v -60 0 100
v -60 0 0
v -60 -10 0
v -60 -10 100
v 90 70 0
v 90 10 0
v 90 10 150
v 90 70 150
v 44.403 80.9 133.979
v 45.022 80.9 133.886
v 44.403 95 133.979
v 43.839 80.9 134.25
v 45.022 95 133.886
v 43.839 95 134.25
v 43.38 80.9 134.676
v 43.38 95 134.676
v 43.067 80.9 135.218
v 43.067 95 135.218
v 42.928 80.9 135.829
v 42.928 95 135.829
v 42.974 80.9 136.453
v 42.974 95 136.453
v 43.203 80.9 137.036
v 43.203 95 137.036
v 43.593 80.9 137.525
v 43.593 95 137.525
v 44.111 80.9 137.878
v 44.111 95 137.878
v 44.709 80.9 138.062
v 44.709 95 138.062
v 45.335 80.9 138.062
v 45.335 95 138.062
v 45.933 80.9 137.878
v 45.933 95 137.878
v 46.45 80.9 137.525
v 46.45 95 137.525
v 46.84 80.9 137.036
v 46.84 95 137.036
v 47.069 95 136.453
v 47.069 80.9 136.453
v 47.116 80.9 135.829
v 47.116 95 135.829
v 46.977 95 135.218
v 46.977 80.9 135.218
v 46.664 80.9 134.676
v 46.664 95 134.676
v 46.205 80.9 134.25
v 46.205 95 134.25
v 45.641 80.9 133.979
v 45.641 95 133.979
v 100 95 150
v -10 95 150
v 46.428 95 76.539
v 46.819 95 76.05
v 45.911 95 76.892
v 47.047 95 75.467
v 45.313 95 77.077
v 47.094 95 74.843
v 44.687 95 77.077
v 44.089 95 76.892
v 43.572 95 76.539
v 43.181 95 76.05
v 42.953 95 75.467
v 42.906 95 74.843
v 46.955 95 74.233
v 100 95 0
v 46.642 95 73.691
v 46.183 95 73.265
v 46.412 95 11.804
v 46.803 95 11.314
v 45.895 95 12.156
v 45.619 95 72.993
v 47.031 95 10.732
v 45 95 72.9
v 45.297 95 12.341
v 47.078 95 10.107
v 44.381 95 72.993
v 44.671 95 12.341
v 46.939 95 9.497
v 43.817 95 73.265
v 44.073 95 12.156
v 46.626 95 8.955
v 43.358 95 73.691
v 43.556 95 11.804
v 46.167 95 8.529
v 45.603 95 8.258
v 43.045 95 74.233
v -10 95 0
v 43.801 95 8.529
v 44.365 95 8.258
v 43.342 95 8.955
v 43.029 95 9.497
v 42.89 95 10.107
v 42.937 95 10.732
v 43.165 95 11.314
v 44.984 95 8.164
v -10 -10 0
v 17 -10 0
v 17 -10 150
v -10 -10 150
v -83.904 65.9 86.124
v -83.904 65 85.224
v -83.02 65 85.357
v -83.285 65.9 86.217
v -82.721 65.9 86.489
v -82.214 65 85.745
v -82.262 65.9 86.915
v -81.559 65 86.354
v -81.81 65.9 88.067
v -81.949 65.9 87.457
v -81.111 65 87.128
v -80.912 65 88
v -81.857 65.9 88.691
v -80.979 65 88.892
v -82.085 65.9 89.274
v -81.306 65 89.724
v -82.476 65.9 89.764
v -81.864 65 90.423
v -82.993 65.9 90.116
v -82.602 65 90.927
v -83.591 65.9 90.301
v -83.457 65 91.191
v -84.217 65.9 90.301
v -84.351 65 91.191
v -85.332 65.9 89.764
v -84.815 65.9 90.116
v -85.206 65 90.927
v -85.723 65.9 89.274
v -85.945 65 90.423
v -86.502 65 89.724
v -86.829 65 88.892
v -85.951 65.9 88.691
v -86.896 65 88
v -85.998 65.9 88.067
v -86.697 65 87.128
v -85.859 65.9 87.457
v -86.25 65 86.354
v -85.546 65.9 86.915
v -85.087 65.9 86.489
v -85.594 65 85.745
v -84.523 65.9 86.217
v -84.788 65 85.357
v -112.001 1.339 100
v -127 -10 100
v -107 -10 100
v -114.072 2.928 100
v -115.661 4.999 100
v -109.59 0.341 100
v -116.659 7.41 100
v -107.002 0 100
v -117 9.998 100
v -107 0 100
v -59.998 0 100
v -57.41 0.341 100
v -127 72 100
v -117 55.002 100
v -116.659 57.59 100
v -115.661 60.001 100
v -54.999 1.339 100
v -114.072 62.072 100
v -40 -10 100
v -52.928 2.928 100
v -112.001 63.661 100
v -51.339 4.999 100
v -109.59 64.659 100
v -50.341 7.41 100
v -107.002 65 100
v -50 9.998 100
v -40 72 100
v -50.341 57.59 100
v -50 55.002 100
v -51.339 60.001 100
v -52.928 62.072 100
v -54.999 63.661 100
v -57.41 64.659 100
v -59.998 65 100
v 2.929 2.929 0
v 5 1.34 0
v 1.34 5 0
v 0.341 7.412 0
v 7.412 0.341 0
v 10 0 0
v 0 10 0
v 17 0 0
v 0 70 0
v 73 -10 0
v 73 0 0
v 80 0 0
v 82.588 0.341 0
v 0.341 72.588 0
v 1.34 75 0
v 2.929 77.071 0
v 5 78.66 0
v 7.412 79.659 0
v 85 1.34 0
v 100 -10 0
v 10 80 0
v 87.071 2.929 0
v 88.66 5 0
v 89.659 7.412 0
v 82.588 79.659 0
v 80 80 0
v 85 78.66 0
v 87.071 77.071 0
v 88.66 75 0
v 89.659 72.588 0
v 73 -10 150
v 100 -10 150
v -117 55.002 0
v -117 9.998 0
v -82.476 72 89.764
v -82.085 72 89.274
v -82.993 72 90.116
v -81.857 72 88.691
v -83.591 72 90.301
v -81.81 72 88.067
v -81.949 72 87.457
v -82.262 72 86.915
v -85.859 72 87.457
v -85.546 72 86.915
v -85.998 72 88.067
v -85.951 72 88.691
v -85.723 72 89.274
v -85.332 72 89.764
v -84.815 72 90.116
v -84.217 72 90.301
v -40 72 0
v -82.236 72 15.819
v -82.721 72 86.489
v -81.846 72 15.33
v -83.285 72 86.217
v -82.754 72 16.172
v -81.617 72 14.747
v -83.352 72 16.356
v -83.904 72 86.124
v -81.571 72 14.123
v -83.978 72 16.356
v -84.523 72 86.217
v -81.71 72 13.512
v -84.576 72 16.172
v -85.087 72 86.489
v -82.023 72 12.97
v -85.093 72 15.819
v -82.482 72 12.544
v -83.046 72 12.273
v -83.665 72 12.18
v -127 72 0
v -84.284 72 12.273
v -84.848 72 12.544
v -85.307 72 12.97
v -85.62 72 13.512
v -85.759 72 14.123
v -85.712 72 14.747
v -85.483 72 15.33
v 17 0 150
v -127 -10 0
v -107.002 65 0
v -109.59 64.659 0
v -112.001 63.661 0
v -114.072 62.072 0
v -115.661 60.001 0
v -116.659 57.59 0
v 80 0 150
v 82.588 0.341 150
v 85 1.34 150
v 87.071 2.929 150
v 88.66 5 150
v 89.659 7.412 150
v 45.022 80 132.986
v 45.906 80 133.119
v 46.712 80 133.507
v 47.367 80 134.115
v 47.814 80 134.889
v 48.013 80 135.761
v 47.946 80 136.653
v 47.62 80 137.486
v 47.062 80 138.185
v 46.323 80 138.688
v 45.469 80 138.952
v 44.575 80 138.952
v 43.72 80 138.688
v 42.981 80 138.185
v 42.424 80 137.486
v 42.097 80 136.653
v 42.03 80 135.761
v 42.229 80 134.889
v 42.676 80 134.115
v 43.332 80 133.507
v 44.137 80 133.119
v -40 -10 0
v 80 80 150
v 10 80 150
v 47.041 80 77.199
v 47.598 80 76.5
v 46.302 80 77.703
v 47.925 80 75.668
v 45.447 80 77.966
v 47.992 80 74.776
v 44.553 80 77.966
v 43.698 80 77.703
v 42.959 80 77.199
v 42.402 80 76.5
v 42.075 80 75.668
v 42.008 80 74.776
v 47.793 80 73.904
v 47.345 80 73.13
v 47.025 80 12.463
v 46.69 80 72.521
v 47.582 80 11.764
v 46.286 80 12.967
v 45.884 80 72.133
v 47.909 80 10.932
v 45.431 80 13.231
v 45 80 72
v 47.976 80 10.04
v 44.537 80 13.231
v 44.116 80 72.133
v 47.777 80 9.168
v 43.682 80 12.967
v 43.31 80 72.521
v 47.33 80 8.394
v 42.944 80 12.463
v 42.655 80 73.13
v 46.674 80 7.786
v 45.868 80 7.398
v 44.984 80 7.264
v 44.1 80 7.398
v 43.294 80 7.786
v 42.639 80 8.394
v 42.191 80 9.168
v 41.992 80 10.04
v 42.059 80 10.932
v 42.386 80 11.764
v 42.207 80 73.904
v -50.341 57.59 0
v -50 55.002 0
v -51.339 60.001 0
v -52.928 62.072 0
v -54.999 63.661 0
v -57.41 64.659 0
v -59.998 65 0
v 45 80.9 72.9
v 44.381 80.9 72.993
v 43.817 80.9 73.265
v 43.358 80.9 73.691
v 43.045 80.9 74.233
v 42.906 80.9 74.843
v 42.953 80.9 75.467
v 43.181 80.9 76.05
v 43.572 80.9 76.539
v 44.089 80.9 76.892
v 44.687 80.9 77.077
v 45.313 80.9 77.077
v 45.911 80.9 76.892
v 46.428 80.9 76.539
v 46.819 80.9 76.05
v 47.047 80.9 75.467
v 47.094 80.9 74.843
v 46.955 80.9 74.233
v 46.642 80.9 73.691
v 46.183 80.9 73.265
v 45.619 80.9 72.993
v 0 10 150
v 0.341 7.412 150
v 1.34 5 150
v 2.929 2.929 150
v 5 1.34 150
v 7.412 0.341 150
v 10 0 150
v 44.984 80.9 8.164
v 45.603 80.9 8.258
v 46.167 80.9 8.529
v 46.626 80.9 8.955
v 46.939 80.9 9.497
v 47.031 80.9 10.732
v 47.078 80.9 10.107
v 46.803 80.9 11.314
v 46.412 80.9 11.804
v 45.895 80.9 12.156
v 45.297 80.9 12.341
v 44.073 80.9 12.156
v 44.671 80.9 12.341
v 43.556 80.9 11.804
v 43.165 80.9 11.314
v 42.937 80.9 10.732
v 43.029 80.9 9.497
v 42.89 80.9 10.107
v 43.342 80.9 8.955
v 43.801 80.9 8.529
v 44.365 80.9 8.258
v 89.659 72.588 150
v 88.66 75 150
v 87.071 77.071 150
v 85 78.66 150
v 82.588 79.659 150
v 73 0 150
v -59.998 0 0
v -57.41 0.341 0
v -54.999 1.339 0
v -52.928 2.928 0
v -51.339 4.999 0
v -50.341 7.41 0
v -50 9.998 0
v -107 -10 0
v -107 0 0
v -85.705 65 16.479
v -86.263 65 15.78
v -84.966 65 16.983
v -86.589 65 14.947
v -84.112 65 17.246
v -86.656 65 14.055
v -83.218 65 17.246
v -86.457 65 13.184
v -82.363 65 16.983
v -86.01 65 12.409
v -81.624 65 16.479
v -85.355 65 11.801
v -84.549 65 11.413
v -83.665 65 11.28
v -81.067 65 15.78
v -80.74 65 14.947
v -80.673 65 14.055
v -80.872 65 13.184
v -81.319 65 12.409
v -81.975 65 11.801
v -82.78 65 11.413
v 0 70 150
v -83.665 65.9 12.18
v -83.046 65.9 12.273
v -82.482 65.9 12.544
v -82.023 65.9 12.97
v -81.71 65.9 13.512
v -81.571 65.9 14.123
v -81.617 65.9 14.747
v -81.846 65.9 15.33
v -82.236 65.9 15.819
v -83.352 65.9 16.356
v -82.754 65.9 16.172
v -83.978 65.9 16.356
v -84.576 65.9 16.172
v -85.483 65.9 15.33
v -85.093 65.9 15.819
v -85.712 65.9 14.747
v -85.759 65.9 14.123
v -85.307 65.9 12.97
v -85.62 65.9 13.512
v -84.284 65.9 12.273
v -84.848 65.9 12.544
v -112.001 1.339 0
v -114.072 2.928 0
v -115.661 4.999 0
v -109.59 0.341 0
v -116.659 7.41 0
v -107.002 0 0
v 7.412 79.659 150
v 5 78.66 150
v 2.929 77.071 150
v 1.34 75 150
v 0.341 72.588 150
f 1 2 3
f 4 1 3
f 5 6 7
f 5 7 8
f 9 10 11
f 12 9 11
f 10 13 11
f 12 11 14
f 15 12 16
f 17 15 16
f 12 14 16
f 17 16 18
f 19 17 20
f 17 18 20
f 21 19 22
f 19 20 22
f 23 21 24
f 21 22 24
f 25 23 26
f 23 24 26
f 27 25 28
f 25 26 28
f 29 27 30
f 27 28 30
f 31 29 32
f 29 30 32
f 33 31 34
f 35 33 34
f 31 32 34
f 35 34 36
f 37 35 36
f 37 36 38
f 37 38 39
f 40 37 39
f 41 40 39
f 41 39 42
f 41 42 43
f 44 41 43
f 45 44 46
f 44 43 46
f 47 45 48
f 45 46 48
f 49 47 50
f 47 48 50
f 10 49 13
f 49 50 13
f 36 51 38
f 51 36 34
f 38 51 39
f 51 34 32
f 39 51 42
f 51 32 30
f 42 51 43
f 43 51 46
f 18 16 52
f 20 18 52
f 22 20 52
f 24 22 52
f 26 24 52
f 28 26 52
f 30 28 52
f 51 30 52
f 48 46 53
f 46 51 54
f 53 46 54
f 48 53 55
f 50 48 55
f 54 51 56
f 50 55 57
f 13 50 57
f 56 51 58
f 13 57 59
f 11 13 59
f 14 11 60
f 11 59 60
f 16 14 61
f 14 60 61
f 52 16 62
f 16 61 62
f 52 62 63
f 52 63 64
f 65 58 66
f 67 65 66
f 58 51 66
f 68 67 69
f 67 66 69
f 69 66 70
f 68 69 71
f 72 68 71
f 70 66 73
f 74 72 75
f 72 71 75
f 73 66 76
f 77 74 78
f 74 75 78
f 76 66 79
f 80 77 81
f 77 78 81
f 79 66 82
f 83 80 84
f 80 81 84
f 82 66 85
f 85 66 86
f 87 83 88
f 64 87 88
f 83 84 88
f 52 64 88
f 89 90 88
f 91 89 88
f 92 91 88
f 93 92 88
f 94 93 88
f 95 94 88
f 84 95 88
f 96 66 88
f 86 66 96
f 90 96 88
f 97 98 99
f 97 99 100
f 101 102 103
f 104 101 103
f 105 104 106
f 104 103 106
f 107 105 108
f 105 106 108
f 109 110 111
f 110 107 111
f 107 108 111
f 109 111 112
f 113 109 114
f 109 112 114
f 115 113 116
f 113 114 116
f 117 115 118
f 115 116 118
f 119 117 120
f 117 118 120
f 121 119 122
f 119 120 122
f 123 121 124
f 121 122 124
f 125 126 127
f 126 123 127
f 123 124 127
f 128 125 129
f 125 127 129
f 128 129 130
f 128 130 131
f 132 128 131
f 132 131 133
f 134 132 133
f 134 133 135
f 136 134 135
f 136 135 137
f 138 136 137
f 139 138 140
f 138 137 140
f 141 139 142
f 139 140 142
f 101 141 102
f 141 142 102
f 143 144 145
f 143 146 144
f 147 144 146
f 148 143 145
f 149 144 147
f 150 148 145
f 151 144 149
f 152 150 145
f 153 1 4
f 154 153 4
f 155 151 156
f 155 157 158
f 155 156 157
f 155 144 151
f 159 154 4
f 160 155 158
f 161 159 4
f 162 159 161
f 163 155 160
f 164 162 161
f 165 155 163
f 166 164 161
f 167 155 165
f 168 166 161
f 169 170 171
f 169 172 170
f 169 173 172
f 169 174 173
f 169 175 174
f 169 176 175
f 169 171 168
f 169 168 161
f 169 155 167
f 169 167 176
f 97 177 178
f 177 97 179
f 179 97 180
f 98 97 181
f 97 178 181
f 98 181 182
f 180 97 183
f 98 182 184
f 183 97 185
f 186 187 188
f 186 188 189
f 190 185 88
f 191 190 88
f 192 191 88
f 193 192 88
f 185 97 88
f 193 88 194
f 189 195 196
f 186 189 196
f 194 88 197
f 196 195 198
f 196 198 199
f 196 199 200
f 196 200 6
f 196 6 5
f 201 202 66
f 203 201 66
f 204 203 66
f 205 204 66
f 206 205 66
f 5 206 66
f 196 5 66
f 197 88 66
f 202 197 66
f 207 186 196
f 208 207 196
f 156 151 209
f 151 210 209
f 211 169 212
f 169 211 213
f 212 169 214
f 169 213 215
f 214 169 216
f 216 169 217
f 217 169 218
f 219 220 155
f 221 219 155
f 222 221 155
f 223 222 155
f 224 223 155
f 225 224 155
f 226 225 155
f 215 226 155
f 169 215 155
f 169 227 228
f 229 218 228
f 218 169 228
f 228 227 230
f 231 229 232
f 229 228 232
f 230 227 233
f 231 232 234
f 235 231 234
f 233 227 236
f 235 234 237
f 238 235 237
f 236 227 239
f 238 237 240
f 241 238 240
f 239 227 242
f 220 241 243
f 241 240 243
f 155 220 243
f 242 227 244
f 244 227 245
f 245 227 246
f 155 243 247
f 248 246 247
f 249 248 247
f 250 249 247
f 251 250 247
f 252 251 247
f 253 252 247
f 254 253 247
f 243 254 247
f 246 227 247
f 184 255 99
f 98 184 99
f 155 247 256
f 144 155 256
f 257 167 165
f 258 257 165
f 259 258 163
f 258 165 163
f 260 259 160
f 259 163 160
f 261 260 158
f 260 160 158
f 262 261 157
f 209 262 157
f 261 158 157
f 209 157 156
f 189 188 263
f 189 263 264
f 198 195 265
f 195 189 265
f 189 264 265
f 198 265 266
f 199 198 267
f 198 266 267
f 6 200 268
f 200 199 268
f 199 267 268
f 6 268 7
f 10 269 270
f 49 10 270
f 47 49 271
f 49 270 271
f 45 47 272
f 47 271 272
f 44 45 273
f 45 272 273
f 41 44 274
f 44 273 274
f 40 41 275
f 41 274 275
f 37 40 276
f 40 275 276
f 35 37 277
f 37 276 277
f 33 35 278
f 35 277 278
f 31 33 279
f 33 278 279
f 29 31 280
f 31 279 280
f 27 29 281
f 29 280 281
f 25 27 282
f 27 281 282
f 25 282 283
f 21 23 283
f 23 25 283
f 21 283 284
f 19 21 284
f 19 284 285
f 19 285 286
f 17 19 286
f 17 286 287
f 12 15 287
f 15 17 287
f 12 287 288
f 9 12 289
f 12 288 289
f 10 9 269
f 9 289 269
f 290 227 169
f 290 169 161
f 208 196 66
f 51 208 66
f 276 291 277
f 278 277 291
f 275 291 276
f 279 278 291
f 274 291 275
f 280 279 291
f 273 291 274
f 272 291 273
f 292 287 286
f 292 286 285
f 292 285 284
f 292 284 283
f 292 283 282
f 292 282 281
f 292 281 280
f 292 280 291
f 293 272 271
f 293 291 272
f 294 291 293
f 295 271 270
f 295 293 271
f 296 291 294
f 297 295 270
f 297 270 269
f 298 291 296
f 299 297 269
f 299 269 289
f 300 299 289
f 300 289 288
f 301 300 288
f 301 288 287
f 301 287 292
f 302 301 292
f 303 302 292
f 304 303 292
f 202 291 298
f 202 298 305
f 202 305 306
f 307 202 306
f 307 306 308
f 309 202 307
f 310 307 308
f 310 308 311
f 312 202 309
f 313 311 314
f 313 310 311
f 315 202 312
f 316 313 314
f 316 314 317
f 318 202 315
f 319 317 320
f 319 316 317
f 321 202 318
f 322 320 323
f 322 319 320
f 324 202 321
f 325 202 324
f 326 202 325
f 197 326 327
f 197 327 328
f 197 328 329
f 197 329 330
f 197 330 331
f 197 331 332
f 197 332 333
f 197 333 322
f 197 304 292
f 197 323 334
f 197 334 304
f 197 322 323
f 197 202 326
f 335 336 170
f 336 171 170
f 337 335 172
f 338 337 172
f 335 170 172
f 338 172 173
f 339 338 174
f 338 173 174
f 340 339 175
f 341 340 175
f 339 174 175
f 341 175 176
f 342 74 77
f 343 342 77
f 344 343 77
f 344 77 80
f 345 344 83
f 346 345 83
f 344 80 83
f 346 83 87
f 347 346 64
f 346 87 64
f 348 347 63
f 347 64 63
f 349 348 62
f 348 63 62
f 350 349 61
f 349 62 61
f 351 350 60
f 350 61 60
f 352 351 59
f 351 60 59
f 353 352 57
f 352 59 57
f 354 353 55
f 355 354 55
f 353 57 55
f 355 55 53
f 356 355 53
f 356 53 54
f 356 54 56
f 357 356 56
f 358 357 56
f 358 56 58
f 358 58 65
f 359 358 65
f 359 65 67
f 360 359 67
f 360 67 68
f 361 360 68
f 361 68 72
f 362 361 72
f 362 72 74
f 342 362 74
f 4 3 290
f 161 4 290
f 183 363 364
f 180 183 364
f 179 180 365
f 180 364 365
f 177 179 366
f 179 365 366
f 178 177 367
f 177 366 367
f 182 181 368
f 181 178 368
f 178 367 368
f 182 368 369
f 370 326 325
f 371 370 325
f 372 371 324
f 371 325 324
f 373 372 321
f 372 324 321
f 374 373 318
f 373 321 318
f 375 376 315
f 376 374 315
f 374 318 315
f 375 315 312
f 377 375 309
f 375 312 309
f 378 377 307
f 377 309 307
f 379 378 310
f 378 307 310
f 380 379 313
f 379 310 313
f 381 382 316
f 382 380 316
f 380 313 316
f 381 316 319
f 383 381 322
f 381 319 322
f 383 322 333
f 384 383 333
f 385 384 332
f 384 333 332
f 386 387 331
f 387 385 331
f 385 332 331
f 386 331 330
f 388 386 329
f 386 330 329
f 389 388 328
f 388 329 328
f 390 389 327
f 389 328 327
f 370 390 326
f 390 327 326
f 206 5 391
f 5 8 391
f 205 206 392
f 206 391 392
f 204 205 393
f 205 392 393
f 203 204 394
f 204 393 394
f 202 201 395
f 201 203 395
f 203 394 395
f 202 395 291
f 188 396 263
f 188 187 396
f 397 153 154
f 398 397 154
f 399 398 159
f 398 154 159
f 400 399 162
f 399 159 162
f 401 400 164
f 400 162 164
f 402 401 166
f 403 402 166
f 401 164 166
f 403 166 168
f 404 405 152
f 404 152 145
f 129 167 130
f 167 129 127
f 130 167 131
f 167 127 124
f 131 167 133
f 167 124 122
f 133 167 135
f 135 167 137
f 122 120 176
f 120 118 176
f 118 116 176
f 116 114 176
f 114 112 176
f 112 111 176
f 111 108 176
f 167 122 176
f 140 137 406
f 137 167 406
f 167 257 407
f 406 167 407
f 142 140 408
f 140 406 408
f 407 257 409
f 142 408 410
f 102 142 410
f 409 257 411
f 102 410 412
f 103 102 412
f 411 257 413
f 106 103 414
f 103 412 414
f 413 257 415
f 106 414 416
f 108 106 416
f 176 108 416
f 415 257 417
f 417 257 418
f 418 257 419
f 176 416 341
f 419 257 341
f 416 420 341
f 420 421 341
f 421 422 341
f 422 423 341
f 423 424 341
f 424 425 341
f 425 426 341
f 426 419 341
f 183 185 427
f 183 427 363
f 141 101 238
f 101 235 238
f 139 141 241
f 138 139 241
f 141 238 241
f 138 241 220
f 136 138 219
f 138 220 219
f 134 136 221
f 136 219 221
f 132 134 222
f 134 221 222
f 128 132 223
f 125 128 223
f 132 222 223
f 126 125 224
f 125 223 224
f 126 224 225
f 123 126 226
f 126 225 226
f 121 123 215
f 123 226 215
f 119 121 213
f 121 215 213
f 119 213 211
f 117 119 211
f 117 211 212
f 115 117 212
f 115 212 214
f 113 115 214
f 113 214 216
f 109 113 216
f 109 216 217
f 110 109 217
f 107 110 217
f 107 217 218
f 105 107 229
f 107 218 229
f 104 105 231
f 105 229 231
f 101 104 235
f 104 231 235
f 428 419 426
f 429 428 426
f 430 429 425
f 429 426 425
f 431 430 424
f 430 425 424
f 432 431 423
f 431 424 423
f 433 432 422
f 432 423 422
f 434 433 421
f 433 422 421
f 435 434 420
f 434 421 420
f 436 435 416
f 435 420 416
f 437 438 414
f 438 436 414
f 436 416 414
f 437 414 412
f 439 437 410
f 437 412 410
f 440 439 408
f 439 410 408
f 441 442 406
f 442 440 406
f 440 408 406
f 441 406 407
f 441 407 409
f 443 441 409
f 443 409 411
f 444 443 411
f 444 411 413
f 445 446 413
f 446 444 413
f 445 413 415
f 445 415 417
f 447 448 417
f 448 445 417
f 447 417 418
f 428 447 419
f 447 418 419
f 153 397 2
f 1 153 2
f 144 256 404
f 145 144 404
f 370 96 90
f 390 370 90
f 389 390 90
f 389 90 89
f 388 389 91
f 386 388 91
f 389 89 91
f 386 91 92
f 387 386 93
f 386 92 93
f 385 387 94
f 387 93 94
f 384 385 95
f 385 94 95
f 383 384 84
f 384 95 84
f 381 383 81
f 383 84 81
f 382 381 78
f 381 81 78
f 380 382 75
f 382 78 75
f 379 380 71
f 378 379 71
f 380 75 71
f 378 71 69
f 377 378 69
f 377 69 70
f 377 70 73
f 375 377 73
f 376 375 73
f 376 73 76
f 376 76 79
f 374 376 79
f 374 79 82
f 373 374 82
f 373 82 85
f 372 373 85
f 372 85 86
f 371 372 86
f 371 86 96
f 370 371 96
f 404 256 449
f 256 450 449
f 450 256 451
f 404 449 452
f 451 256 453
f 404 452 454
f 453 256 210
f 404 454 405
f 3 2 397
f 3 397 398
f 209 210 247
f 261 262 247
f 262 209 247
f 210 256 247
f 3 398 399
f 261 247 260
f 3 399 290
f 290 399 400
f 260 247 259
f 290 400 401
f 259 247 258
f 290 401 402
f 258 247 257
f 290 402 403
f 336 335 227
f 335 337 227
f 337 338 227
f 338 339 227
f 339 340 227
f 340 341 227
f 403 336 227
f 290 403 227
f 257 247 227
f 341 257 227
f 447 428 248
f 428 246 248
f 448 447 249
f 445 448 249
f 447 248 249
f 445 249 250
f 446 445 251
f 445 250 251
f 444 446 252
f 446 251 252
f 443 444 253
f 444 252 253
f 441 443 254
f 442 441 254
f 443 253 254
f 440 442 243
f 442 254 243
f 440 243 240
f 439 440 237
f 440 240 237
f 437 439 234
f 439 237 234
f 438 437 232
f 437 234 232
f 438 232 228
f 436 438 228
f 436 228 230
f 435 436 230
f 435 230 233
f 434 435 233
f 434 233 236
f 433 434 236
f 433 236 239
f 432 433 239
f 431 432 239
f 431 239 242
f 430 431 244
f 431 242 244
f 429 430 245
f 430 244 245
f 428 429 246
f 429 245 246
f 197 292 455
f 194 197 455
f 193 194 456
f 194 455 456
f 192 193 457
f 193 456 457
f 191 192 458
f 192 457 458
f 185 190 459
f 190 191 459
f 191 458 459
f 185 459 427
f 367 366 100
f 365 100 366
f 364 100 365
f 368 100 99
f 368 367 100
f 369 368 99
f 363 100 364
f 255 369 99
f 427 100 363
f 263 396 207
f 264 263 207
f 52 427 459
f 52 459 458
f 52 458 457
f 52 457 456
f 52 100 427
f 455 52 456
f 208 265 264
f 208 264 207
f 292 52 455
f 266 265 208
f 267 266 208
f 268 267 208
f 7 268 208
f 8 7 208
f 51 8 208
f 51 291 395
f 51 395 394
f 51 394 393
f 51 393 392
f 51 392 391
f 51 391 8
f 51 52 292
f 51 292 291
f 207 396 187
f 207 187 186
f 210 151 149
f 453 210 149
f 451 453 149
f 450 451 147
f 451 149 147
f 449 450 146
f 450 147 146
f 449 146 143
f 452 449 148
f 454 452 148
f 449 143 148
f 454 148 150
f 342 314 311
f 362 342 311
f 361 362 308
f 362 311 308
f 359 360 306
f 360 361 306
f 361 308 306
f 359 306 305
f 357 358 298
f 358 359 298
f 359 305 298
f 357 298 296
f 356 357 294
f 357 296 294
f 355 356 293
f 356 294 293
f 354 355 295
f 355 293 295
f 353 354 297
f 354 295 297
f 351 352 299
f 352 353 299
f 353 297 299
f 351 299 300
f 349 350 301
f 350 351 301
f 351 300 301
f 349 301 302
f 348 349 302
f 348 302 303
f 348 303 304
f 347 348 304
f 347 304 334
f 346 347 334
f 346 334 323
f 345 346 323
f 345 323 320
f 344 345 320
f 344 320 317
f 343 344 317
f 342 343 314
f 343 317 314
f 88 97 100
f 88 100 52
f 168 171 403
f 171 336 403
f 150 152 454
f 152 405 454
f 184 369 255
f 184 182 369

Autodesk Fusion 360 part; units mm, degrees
sketch "Sketch1" plane through (0, 0, 0) normal (0, 0, 1) x (1, 0, 0)
  line L0 (0, 0) -> (90, 0)
  line L1 (90, 0) -> (90, 80)
  line L2 (90, 80) -> (0, 80)
  line L3 (0, 80) -> (0, 0)
  line L4 (0, 0) -> (17, 0)
  line L5 (17, 0) -> (17, -10)
  line L6 (17, -10) -> (0, -10)
  line L7 (0, -10) -> (0, 0)
  line L8 (90, 0) -> (73, 0)
  line L9 (73, 0) -> (73, -10)
  line L10 (73, -10) -> (90, -10)
  line L11 (90, -10) -> (90, 0)
  line L12 (0, -10) -> (-10, -10)
  line L13 (-10, -10) -> (-10, 80)
  line L14 (-10, 80) -> (0, 80)
  line L15 (0, 80) -> (0, -10)
  line L16 (85, -10) -> (90, -10)
  line L17 (90, -10) -> (90, 80)
  line L18 (90, -10) -> (100, -10)
  line L19 (100, -10) -> (100, 80)
  line L20 (100, 80) -> (90, 80)
  line L21 (90, 80) -> (90, -10)
  line L22 (-10, 80) -> (100, 80)
  line L23 (100, 80) -> (100, 95)
  line L24 (100, 95) -> (-10, 95)
  line L25 (-10, 95) -> (-10, 80)
  dimension "d1" = 90
  dimension "d2" = 80
  dimension "d3" = 17
  dimension "d4" = 10
  dimension "d5" = 17
  dimension "d6" = 10
  dimension "d7" = 10
  dimension "d8" = 90
extrude "Extrude1" add sketch "Sketch1" along normal blind 150 contours L3 L7 L12 L13 L14 L15 L22 | L0 L4 L5 L6 L7 L15 | L2 L14 L20 L22 L23 L24 L25 | L0 L8 L9 L10 L11 L16 L17 L21 | L1 L11 L17 L18 L19 L20 L21 L22 makes body 1
hole "Hole1" at (45, 80, 75) direction (0, 1, 0) diameter 4.2 depth 20 tip angle 118 countersink diameter 6 countersink angle 90 bodies 1
sketch "Sketch2" plane through (0, 80, 0) normal (0, -1, 0) x (1, 0, 0)
  circle A0 centre (45, 75) radius 3
  line L0 (0, 0) -> (90, 0)
  line L1 (90, 0) -> (90, 150)
  line L2 (90, 150) -> (0, 150)
  line L3 (0, 150) -> (0, 0)
  line L4 (45, 75) -> (45, 150)
  line L5 (45, 75) -> (45, 0)
hole "Hole2" at (45.0217, 80, 135.9855) direction (0, 1, 0) diameter 4.2 depth 20 tip angle 118 countersink diameter 6 countersink angle 90 bodies 1
hole "Hole3" at (44.9841, 80, 10.2643) direction (0, 1, 0) diameter 4.2 depth 20 tip angle 118 countersink diameter 6 countersink angle 90 bodies 1
sketch "Sketch3" plane through (0, 0, 0) normal (0, 0, 1) x (1, 0, 0)
  line L0 (-50, 0) -> (-117, 0)
  line L1 (-117, 0) -> (-117, 65)
  line L2 (-117, 65) -> (-50, 65)
  line L3 (-50, 65) -> (-50, 0)
  line L4 (-117, 0) -> (-107, 0)
  line L5 (-107, 0) -> (-107, -10)
  line L6 (-107, -10) -> (-117, -10)
  line L7 (-117, -10) -> (-117, 0)
  line L8 (-50, 0) -> (-60, 0)
  line L9 (-60, 0) -> (-60, -10)
  line L10 (-60, -10) -> (-50, -10)
  line L11 (-50, -10) -> (-50, 0)
  line L12 (-117, 65) -> (-127, 65)
  line L13 (-127, 65) -> (-127, -10)
  line L14 (-127, -10) -> (-117, -10)
  line L15 (-117, -10) -> (-117, 65)
  line L16 (-50, 65) -> (-40, 65)
  line L17 (-40, 65) -> (-40, -10)
  line L18 (-40, -10) -> (-50, -10)
  line L19 (-50, -10) -> (-50, 65)
  line L20 (-127, 65) -> (-40, 65)
  line L21 (-40, 65) -> (-40, 72)
  line L22 (-40, 72) -> (-127, 72)
  line L23 (-127, 72) -> (-127, 65)
  dimension "d27" = 67
  dimension "d28" = 65
  dimension "d29" = 10
  dimension "d30" = 10
  dimension "d31" = 10
  dimension "d32" = 7
extrude "Extrude2" add sketch "Sketch3" along normal blind 100 separate body contours L0 L8 L9 L10 L11 L19 | L3 L11 L16 L17 L18 L19 L20 | L2 L12 L16 L20 L21 L22 L23 | L0 L4 L5 L6 L7 L15 | L1 L7 L12 L13 L14 L15 L20 makes body 2
fillet "Fillet1" radius 10 8 edges at (0, 80, 75) (0, 0, 75) (90, 0, 75) (90, 80, 75) (-117, 65, 50) (-50, 65, 50) (-117, 0, 50) (-50, 0, 50) on bodies 1 2
hole "Hole4" at (-83.9041, 65, 88.2242) direction (0, 1, 0) diameter 4.2 depth 10 tip angle 118 countersink diameter 6 countersink angle 90 bodies 2
hole "Hole5" at (-83.6647, 65, 14.2796) direction (0, 1, 0) diameter 4.2 depth 10 tip angle 118 countersink diameter 6 countersink angle 90 bodies 2
